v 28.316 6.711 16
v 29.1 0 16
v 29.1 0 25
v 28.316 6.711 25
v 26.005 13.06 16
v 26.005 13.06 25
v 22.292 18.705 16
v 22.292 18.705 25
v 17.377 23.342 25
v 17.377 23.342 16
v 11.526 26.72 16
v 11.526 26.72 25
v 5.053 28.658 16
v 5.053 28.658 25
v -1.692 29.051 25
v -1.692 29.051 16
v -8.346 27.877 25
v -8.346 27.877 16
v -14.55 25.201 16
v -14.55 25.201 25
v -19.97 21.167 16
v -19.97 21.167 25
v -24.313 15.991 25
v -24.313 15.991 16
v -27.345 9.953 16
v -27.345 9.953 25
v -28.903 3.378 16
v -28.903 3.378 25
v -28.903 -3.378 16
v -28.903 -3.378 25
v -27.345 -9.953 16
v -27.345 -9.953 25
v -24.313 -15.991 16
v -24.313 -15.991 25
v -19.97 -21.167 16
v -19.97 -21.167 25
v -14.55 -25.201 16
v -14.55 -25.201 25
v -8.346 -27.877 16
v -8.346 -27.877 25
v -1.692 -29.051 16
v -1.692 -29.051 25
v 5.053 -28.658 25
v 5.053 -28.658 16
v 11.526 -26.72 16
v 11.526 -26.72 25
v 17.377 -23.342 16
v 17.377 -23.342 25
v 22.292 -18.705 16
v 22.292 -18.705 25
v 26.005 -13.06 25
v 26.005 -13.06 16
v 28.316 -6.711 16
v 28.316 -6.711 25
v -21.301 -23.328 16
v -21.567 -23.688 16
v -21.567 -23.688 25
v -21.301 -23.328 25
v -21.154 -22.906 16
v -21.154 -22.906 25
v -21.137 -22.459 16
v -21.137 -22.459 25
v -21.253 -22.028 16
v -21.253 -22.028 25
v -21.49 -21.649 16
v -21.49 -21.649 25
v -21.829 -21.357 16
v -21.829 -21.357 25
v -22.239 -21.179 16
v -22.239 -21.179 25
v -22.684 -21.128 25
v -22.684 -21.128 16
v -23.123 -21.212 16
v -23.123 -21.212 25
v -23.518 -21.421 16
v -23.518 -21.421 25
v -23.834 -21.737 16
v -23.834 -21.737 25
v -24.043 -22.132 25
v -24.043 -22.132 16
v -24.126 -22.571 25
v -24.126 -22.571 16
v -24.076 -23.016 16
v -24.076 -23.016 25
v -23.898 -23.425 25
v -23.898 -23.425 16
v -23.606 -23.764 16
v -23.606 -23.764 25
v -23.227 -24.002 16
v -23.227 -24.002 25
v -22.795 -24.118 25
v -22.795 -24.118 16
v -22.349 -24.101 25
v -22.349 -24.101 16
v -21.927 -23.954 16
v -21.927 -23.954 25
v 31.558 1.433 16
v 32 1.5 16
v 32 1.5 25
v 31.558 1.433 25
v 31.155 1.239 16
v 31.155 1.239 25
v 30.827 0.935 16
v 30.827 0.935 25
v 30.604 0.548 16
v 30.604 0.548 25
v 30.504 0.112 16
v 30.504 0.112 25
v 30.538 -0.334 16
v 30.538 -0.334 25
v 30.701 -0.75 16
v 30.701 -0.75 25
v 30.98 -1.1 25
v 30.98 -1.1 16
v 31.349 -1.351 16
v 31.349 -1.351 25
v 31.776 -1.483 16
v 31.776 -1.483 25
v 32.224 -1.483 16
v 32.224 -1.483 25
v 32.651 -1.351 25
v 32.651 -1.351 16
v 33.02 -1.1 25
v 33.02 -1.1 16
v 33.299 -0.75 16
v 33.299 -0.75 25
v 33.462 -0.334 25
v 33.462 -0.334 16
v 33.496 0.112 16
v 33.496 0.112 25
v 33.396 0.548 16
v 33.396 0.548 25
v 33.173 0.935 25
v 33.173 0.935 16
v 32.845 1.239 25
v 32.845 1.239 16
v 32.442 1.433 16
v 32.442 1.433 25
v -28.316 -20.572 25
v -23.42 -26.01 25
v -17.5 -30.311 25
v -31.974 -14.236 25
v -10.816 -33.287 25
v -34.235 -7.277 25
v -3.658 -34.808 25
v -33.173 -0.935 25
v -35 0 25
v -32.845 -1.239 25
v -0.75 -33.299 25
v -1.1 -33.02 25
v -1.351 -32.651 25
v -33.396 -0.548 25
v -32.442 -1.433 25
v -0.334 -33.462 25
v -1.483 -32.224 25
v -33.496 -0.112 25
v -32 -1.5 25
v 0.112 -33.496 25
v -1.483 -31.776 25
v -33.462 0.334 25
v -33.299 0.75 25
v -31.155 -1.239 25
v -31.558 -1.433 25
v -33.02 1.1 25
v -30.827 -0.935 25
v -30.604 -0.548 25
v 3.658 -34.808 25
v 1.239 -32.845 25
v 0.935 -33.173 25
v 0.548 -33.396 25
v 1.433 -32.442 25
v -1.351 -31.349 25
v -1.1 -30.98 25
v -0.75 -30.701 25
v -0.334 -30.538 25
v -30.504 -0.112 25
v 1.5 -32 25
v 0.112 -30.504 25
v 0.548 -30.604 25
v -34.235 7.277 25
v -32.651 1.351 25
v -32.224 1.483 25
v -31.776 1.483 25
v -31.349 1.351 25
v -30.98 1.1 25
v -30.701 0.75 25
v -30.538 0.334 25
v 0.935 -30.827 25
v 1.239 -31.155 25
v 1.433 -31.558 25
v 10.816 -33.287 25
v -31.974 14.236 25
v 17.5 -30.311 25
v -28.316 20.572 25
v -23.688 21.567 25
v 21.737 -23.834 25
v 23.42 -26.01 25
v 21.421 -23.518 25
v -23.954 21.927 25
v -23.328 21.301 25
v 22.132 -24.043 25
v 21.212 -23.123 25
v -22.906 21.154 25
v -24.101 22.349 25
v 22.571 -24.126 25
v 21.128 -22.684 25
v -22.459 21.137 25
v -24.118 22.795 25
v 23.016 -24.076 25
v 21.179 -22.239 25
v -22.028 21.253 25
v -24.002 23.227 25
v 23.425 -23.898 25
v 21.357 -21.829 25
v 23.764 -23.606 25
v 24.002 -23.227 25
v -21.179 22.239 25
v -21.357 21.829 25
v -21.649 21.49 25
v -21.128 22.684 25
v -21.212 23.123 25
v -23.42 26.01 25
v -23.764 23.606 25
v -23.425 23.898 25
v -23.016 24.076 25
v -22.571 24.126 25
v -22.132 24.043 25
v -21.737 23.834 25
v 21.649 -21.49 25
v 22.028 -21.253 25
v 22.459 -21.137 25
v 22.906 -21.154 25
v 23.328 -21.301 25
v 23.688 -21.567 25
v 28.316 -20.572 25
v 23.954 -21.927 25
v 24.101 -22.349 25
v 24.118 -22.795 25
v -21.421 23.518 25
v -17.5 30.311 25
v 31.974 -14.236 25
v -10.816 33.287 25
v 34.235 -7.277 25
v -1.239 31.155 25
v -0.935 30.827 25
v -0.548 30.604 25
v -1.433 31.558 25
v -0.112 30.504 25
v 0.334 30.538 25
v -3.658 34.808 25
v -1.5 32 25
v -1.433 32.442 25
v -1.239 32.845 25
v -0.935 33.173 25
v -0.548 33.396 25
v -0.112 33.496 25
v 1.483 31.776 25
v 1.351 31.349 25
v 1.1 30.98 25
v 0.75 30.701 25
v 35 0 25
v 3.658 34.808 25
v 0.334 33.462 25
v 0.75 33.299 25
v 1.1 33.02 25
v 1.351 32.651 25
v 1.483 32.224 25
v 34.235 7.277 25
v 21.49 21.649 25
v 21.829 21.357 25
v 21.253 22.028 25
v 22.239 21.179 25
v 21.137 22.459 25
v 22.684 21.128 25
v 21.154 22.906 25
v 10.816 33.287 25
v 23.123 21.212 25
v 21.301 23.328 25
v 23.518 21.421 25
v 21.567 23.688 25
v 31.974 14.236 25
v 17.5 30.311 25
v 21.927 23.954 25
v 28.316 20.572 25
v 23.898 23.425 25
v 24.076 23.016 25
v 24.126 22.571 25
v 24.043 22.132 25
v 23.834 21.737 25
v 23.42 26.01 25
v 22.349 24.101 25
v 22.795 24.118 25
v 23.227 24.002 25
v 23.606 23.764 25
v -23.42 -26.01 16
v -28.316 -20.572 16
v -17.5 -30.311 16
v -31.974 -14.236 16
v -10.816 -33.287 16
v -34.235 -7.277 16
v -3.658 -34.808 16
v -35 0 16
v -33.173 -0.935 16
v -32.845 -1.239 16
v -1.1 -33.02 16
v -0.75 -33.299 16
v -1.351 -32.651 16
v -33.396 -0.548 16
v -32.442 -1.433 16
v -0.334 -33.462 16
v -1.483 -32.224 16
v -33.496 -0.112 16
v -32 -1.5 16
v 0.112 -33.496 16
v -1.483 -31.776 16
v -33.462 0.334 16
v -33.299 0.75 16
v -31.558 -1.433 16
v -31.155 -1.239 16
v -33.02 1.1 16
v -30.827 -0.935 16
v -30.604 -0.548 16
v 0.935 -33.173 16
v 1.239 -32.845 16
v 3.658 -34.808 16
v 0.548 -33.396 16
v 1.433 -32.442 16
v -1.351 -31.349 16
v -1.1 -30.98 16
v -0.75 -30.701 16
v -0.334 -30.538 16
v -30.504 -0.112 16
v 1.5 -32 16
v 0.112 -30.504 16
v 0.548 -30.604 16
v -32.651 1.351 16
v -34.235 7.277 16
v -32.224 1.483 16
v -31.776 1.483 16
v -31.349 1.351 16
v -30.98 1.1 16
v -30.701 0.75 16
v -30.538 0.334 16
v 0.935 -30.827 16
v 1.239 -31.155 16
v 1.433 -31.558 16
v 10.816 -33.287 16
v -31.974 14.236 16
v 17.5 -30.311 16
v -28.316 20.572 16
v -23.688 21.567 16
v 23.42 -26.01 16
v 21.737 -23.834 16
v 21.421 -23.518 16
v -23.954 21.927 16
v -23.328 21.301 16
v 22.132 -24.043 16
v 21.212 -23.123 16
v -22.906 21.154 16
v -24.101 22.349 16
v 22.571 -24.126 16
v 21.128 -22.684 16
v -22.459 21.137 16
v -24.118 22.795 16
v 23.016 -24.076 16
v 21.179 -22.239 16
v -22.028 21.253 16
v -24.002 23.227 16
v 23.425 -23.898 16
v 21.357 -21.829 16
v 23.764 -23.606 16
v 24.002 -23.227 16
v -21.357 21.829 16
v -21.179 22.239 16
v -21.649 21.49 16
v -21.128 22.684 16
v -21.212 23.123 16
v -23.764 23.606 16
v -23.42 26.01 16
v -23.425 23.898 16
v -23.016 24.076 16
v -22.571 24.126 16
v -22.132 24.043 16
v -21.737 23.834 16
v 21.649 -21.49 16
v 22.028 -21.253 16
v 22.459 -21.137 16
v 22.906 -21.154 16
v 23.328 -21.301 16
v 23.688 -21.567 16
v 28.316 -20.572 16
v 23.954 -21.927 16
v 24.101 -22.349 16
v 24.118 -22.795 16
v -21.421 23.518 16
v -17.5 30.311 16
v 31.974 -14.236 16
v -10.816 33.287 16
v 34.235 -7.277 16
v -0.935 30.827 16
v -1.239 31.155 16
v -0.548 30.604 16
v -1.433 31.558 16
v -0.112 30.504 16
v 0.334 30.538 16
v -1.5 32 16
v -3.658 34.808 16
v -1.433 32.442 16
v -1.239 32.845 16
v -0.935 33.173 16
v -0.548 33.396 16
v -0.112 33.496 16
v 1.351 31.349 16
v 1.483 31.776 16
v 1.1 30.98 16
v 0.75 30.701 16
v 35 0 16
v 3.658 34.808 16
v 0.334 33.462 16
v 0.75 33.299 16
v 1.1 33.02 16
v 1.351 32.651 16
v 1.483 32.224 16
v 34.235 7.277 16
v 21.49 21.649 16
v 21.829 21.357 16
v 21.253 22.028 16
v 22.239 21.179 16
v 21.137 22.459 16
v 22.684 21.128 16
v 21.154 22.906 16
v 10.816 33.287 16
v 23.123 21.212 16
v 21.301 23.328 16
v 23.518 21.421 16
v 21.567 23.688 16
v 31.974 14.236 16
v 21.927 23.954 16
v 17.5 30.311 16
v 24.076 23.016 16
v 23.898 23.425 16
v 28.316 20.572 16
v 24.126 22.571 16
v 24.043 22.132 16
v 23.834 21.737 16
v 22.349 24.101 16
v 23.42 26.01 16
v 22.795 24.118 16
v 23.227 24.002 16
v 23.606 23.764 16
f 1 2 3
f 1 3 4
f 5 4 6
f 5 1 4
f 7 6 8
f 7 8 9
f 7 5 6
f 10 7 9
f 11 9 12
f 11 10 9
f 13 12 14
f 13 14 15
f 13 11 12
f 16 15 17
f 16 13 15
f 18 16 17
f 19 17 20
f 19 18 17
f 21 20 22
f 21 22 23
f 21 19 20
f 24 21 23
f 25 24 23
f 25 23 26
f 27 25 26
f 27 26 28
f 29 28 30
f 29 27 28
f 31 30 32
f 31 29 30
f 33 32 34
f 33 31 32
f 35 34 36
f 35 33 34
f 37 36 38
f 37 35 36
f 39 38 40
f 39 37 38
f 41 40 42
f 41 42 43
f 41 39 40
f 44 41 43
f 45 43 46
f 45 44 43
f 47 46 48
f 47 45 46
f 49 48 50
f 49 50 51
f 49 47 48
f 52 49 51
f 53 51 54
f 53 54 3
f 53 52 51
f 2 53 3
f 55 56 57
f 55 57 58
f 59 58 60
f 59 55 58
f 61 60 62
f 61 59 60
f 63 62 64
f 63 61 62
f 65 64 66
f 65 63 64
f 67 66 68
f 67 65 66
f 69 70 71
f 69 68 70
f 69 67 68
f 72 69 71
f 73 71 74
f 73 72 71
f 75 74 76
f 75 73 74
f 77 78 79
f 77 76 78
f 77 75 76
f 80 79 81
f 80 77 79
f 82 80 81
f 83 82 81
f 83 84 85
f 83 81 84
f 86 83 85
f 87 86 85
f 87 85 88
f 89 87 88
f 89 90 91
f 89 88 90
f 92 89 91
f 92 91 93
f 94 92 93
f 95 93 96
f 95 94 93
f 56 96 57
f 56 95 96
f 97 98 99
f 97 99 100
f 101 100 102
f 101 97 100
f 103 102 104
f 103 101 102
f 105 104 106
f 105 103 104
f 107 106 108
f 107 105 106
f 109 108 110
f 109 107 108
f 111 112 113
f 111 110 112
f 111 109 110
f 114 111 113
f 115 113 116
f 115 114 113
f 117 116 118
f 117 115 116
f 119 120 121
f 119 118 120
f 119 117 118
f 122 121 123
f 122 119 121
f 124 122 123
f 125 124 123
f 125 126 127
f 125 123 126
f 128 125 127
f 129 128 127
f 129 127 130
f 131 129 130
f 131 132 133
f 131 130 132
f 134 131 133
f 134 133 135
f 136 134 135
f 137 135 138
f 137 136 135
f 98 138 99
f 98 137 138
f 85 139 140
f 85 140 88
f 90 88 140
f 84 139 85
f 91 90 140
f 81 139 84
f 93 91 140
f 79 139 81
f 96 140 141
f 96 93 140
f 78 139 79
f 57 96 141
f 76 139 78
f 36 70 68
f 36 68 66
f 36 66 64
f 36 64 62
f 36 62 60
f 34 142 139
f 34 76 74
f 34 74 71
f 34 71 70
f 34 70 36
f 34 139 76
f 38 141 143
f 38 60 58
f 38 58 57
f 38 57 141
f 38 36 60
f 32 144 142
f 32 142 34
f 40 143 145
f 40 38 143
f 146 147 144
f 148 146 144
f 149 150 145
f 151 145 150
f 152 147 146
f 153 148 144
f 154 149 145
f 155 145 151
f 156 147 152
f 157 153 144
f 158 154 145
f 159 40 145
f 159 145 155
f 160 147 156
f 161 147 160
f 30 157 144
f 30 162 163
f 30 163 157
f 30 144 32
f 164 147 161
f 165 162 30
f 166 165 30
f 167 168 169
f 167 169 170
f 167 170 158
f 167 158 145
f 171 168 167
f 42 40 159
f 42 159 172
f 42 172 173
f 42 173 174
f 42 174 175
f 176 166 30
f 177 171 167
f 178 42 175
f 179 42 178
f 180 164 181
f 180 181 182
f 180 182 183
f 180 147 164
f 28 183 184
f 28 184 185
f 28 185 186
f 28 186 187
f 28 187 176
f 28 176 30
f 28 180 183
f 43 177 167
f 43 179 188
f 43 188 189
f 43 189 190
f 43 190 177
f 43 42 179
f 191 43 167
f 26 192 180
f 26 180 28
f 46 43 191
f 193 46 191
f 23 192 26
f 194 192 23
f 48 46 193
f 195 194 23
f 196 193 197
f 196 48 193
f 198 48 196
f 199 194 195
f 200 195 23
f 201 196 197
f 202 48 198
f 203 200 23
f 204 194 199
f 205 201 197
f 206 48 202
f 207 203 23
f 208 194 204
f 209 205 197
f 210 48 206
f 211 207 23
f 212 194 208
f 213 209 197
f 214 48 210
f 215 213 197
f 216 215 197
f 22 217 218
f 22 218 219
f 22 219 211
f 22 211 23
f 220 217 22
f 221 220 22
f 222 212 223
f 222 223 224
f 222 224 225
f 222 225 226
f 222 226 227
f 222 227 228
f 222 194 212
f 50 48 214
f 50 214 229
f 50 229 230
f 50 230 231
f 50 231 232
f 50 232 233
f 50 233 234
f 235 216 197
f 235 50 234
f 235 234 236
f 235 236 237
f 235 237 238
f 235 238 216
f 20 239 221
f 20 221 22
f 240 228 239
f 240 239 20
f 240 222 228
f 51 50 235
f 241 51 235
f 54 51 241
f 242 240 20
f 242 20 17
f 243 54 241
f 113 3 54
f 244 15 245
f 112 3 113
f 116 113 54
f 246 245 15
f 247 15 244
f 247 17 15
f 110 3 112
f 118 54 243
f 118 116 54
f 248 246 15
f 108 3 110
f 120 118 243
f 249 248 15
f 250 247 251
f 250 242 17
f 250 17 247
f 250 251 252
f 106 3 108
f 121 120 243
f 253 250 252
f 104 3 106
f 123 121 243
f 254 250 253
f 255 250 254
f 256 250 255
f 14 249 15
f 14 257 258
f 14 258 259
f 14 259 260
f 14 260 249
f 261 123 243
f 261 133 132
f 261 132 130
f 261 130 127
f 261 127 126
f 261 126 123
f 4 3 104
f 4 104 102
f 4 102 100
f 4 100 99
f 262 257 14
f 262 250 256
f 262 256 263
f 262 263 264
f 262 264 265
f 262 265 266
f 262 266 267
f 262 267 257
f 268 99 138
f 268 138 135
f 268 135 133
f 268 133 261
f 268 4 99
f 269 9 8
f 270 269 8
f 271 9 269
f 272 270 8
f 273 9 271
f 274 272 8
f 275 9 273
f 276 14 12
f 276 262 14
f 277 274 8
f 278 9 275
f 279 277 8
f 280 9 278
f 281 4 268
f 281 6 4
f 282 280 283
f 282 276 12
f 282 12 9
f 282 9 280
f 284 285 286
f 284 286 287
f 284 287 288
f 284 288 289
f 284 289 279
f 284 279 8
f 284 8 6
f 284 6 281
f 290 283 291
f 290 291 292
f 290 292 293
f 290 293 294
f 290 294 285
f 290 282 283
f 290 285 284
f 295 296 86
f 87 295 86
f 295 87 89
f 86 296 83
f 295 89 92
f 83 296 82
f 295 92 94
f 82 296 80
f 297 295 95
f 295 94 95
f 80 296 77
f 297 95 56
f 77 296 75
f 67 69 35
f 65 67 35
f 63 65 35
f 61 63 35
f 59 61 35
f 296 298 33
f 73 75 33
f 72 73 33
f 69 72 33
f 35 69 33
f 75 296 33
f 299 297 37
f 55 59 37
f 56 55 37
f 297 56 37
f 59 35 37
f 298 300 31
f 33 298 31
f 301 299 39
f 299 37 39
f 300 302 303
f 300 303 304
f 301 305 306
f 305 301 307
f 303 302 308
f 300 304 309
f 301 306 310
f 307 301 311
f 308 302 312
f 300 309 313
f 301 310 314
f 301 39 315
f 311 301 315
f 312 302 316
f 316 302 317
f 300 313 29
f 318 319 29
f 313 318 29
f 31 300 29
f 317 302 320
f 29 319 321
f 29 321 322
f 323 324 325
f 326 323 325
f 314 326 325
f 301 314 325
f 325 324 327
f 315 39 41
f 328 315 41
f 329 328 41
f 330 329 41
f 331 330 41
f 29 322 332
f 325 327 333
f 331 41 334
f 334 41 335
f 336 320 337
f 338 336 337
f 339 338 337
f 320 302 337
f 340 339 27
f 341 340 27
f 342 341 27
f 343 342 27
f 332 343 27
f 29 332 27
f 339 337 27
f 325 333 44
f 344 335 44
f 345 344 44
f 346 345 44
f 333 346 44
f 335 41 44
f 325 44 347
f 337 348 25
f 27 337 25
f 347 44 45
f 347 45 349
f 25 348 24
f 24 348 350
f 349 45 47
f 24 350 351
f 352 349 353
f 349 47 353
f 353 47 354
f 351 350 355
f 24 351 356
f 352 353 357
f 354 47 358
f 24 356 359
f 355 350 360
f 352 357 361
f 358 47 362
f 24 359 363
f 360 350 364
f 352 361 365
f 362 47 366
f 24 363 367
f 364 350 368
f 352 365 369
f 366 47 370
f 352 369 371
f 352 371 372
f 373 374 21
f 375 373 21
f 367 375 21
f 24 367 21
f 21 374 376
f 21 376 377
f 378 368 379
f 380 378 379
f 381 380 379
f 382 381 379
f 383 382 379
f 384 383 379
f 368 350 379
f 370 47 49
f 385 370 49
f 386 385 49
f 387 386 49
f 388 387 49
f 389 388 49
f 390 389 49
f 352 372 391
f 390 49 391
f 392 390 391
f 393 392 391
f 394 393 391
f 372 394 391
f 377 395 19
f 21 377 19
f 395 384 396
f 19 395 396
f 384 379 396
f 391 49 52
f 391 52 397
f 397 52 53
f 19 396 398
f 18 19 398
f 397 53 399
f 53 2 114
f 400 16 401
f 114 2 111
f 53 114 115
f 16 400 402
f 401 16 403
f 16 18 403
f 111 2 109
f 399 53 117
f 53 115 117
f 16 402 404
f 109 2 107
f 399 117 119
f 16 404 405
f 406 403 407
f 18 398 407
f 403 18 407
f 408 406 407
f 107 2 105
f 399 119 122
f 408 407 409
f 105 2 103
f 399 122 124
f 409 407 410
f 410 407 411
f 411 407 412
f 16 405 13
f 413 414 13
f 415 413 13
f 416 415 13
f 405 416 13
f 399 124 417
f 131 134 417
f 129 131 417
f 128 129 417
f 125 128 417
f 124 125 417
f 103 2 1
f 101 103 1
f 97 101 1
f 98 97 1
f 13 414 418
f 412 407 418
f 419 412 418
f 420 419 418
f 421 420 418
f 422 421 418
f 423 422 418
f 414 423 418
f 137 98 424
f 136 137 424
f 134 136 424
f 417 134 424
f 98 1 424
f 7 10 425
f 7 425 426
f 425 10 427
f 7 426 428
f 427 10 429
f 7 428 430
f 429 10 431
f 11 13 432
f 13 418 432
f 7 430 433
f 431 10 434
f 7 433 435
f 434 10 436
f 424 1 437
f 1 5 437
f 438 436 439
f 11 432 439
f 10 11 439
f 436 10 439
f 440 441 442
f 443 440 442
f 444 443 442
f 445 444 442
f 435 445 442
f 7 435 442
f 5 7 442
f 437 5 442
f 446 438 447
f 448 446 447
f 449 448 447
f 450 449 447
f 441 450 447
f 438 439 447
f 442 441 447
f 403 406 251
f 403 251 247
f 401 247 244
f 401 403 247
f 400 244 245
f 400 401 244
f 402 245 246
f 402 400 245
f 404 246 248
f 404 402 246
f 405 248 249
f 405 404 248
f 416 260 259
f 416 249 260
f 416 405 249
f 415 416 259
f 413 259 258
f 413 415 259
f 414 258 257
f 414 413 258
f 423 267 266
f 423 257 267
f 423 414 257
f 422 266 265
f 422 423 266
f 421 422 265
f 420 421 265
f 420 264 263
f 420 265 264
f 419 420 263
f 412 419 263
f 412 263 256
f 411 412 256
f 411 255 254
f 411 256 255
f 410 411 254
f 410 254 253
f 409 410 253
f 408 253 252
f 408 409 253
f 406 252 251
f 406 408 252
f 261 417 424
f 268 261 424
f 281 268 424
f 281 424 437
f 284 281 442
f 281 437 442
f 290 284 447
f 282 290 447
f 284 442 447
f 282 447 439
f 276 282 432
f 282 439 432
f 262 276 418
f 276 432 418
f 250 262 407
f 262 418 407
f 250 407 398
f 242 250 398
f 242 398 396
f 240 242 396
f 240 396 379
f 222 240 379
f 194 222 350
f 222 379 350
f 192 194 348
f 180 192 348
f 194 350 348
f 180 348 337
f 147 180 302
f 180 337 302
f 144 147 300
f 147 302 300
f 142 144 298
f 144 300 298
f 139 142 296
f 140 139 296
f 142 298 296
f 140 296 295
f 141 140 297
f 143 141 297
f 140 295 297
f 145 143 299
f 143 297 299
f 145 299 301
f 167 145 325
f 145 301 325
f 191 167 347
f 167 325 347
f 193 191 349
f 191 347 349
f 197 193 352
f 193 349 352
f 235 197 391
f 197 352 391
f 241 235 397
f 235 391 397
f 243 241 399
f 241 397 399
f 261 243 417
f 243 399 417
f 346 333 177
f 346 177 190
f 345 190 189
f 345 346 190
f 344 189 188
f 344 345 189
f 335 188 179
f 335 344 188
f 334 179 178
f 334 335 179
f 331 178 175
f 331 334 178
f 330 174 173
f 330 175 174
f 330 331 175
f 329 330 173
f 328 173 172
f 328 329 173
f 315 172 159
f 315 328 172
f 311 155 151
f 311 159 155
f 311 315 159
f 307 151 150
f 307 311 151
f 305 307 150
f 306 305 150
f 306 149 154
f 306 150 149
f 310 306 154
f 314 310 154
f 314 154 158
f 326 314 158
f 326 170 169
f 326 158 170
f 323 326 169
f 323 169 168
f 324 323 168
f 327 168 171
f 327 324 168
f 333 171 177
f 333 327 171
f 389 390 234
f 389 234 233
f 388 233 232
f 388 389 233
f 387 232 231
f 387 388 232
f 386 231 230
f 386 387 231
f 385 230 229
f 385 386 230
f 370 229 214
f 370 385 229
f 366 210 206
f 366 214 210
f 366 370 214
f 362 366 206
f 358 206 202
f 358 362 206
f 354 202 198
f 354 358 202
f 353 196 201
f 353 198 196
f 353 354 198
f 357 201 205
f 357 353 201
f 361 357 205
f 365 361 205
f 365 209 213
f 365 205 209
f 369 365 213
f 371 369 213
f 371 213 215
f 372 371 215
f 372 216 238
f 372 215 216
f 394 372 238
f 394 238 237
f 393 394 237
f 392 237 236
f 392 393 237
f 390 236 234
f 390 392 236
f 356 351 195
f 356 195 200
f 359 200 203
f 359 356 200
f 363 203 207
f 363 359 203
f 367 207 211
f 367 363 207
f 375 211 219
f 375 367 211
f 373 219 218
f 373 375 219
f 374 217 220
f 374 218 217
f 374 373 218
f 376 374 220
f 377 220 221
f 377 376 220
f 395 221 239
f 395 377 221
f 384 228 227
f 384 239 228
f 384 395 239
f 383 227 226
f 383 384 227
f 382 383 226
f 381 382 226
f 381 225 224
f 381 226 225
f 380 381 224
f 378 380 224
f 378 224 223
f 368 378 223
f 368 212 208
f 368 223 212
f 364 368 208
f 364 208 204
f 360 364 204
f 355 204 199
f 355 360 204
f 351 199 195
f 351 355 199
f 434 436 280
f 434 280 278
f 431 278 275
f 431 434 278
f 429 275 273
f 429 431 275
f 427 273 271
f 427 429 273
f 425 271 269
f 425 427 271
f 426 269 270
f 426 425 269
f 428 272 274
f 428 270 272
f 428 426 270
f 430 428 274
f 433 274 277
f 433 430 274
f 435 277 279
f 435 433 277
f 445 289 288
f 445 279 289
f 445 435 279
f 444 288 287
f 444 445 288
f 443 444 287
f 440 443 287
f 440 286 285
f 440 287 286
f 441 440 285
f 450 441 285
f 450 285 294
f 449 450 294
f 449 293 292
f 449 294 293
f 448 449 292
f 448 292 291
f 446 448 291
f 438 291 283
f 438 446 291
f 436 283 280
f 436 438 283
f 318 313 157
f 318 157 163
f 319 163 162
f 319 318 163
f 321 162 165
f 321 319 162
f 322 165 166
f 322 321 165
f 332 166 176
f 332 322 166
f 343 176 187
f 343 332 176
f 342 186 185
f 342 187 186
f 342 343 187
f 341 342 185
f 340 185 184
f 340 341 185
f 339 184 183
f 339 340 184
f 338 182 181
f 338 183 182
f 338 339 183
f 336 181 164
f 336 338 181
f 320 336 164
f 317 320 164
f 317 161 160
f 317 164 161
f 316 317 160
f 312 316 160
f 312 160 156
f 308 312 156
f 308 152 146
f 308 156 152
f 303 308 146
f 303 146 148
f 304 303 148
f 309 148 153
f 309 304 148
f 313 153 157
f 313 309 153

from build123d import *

# Parameters (mm, degrees)
CYLINDER1752_R               = 1.5
CYLINDER1752_DEPTH           = 30
CYLINDER1752_PLACEMENT_ANGLE = 45
CYLINDER1753_R               = 1.5
CYLINDER1753_DEPTH           = 30
CYLINDER1754_R               = 1.5
CYLINDER1754_DEPTH           = 30
CYLINDER1754_PLACEMENT_ANGLE = 135
CYLINDER1750_R               = 1.5
CYLINDER1750_DEPTH           = 30
CYLINDER1748_R               = 1.5
CYLINDER1748_DEPTH           = 30
CYLINDER1748_PLACEMENT_ANGLE = 225
CYLINDER1751_R               = 1.5
CYLINDER1751_DEPTH           = 30
CYLINDER1749_R               = 1.5
CYLINDER1749_DEPTH           = 30
CYLINDER1749_PLACEMENT_ANGLE = 45
CYLINDER1755_R               = 1.5
CYLINDER1755_DEPTH           = 30
TUBE089_R                    = 35
TUBE089_R_2                  = 29.1
TUBE089_DEPTH                = 9


with BuildPart() as v_lec1752:
    # Cylinder1752 → Cylinder1752 (new body)
    with BuildSketch(Plane.XY):
        Circle(CYLINDER1752_R)
    extrude(amount=CYLINDER1752_DEPTH)


with BuildPart() as v_lec1752_1:
    # Cylinder1752 placement: moved
    add(v_lec1752.part.moved(Location((22.627417, -22.627417, 0))).rotate(Axis((22.627417, -22.627417, 0), (0, 0, 1)), CYLINDER1752_PLACEMENT_ANGLE))


with BuildPart() as v_lec1753:
    # Cylinder1753 → Cylinder1753 (new body)
    with BuildSketch(Plane(origin=(32, 0, 0), x_dir=(0, 1, 0), z_dir=(0, 0, 1))):
        Circle(CYLINDER1753_R)
    extrude(amount=CYLINDER1753_DEPTH)


with BuildPart() as v_lec1754:
    # Cylinder1754 → Cylinder1754 (new body)
    with BuildSketch(Plane.XY):
        Circle(CYLINDER1754_R)
    extrude(amount=CYLINDER1754_DEPTH)


with BuildPart() as v_lec1754_1:
    # Cylinder1754 placement: moved
    add(v_lec1754.part.moved(Location((22.627417, 22.627417, 0))).rotate(Axis((22.627417, 22.627417, 0), (0, 0, 1)), CYLINDER1754_PLACEMENT_ANGLE))


with BuildPart() as v_lec1750:
    # Cylinder1750 → Cylinder1750 (new body)
    with BuildSketch(Plane(origin=(0, 32, 0), x_dir=(-1, 0, 0), z_dir=(0, 0, 1))):
        Circle(CYLINDER1750_R)
    extrude(amount=CYLINDER1750_DEPTH)


with BuildPart() as v_lec1748:
    # Cylinder1748 → Cylinder1748 (new body)
    with BuildSketch(Plane.XY):
        Circle(CYLINDER1748_R)
    extrude(amount=CYLINDER1748_DEPTH)


with BuildPart() as v_lec1748_1:
    # Cylinder1748 placement: moved
    add(v_lec1748.part.moved(Location((-22.627417, 22.627417, 0))).rotate(Axis((-22.627417, 22.627417, 0), (0, 0, 1)), CYLINDER1748_PLACEMENT_ANGLE))


with BuildPart() as v_lec1751:
    # Cylinder1751 → Cylinder1751 (new body)
    with BuildSketch(Plane(origin=(-32, 0, 0), x_dir=(0, -1, 0), z_dir=(0, 0, 1))):
        Circle(CYLINDER1751_R)
    extrude(amount=CYLINDER1751_DEPTH)


with BuildPart() as v_lec1749:
    # Cylinder1749 → Cylinder1749 (new body)
    with BuildSketch(Plane.XY):
        Circle(CYLINDER1749_R)
    extrude(amount=CYLINDER1749_DEPTH)


with BuildPart() as v_lec1749_1:
    # Cylinder1749 placement: moved
    add(v_lec1749.part.moved(Location((-22.627417, -22.627417, 0))).rotate(Axis((-22.627417, -22.627417, 0), (0, 0, -1)), CYLINDER1749_PLACEMENT_ANGLE))


with BuildPart() as compound879:
    # Cylinder1755 → Cylinder1755 (new body)
    with BuildSketch(Plane(origin=(0, -32, 0), x_dir=(1, 0, 0), z_dir=(0, 0, 1))):
        Circle(CYLINDER1755_R)
    extrude(amount=CYLINDER1755_DEPTH)

    # Compound879: union Válec1752, Válec1753, Válec1754, Válec1750, Válec1748, Válec1751, Válec1749
    add(v_lec1752_1.part)
    add(v_lec1753.part)
    add(v_lec1754_1.part)
    add(v_lec1750.part)
    add(v_lec1748_1.part)
    add(v_lec1751.part)
    add(v_lec1749_1.part)


with BuildPart() as cut508:
    # Tube089 → Tube089 (new body)
    with BuildSketch(Plane.XY.offset(16)):
        Circle(TUBE089_R)
        Circle(TUBE089_R_2, mode=Mode.SUBTRACT)
    extrude(amount=TUBE089_DEPTH)

    # Cut508: cut Compound879
    add(compound879.part, mode=Mode.SUBTRACT)


solid = cut508.part
